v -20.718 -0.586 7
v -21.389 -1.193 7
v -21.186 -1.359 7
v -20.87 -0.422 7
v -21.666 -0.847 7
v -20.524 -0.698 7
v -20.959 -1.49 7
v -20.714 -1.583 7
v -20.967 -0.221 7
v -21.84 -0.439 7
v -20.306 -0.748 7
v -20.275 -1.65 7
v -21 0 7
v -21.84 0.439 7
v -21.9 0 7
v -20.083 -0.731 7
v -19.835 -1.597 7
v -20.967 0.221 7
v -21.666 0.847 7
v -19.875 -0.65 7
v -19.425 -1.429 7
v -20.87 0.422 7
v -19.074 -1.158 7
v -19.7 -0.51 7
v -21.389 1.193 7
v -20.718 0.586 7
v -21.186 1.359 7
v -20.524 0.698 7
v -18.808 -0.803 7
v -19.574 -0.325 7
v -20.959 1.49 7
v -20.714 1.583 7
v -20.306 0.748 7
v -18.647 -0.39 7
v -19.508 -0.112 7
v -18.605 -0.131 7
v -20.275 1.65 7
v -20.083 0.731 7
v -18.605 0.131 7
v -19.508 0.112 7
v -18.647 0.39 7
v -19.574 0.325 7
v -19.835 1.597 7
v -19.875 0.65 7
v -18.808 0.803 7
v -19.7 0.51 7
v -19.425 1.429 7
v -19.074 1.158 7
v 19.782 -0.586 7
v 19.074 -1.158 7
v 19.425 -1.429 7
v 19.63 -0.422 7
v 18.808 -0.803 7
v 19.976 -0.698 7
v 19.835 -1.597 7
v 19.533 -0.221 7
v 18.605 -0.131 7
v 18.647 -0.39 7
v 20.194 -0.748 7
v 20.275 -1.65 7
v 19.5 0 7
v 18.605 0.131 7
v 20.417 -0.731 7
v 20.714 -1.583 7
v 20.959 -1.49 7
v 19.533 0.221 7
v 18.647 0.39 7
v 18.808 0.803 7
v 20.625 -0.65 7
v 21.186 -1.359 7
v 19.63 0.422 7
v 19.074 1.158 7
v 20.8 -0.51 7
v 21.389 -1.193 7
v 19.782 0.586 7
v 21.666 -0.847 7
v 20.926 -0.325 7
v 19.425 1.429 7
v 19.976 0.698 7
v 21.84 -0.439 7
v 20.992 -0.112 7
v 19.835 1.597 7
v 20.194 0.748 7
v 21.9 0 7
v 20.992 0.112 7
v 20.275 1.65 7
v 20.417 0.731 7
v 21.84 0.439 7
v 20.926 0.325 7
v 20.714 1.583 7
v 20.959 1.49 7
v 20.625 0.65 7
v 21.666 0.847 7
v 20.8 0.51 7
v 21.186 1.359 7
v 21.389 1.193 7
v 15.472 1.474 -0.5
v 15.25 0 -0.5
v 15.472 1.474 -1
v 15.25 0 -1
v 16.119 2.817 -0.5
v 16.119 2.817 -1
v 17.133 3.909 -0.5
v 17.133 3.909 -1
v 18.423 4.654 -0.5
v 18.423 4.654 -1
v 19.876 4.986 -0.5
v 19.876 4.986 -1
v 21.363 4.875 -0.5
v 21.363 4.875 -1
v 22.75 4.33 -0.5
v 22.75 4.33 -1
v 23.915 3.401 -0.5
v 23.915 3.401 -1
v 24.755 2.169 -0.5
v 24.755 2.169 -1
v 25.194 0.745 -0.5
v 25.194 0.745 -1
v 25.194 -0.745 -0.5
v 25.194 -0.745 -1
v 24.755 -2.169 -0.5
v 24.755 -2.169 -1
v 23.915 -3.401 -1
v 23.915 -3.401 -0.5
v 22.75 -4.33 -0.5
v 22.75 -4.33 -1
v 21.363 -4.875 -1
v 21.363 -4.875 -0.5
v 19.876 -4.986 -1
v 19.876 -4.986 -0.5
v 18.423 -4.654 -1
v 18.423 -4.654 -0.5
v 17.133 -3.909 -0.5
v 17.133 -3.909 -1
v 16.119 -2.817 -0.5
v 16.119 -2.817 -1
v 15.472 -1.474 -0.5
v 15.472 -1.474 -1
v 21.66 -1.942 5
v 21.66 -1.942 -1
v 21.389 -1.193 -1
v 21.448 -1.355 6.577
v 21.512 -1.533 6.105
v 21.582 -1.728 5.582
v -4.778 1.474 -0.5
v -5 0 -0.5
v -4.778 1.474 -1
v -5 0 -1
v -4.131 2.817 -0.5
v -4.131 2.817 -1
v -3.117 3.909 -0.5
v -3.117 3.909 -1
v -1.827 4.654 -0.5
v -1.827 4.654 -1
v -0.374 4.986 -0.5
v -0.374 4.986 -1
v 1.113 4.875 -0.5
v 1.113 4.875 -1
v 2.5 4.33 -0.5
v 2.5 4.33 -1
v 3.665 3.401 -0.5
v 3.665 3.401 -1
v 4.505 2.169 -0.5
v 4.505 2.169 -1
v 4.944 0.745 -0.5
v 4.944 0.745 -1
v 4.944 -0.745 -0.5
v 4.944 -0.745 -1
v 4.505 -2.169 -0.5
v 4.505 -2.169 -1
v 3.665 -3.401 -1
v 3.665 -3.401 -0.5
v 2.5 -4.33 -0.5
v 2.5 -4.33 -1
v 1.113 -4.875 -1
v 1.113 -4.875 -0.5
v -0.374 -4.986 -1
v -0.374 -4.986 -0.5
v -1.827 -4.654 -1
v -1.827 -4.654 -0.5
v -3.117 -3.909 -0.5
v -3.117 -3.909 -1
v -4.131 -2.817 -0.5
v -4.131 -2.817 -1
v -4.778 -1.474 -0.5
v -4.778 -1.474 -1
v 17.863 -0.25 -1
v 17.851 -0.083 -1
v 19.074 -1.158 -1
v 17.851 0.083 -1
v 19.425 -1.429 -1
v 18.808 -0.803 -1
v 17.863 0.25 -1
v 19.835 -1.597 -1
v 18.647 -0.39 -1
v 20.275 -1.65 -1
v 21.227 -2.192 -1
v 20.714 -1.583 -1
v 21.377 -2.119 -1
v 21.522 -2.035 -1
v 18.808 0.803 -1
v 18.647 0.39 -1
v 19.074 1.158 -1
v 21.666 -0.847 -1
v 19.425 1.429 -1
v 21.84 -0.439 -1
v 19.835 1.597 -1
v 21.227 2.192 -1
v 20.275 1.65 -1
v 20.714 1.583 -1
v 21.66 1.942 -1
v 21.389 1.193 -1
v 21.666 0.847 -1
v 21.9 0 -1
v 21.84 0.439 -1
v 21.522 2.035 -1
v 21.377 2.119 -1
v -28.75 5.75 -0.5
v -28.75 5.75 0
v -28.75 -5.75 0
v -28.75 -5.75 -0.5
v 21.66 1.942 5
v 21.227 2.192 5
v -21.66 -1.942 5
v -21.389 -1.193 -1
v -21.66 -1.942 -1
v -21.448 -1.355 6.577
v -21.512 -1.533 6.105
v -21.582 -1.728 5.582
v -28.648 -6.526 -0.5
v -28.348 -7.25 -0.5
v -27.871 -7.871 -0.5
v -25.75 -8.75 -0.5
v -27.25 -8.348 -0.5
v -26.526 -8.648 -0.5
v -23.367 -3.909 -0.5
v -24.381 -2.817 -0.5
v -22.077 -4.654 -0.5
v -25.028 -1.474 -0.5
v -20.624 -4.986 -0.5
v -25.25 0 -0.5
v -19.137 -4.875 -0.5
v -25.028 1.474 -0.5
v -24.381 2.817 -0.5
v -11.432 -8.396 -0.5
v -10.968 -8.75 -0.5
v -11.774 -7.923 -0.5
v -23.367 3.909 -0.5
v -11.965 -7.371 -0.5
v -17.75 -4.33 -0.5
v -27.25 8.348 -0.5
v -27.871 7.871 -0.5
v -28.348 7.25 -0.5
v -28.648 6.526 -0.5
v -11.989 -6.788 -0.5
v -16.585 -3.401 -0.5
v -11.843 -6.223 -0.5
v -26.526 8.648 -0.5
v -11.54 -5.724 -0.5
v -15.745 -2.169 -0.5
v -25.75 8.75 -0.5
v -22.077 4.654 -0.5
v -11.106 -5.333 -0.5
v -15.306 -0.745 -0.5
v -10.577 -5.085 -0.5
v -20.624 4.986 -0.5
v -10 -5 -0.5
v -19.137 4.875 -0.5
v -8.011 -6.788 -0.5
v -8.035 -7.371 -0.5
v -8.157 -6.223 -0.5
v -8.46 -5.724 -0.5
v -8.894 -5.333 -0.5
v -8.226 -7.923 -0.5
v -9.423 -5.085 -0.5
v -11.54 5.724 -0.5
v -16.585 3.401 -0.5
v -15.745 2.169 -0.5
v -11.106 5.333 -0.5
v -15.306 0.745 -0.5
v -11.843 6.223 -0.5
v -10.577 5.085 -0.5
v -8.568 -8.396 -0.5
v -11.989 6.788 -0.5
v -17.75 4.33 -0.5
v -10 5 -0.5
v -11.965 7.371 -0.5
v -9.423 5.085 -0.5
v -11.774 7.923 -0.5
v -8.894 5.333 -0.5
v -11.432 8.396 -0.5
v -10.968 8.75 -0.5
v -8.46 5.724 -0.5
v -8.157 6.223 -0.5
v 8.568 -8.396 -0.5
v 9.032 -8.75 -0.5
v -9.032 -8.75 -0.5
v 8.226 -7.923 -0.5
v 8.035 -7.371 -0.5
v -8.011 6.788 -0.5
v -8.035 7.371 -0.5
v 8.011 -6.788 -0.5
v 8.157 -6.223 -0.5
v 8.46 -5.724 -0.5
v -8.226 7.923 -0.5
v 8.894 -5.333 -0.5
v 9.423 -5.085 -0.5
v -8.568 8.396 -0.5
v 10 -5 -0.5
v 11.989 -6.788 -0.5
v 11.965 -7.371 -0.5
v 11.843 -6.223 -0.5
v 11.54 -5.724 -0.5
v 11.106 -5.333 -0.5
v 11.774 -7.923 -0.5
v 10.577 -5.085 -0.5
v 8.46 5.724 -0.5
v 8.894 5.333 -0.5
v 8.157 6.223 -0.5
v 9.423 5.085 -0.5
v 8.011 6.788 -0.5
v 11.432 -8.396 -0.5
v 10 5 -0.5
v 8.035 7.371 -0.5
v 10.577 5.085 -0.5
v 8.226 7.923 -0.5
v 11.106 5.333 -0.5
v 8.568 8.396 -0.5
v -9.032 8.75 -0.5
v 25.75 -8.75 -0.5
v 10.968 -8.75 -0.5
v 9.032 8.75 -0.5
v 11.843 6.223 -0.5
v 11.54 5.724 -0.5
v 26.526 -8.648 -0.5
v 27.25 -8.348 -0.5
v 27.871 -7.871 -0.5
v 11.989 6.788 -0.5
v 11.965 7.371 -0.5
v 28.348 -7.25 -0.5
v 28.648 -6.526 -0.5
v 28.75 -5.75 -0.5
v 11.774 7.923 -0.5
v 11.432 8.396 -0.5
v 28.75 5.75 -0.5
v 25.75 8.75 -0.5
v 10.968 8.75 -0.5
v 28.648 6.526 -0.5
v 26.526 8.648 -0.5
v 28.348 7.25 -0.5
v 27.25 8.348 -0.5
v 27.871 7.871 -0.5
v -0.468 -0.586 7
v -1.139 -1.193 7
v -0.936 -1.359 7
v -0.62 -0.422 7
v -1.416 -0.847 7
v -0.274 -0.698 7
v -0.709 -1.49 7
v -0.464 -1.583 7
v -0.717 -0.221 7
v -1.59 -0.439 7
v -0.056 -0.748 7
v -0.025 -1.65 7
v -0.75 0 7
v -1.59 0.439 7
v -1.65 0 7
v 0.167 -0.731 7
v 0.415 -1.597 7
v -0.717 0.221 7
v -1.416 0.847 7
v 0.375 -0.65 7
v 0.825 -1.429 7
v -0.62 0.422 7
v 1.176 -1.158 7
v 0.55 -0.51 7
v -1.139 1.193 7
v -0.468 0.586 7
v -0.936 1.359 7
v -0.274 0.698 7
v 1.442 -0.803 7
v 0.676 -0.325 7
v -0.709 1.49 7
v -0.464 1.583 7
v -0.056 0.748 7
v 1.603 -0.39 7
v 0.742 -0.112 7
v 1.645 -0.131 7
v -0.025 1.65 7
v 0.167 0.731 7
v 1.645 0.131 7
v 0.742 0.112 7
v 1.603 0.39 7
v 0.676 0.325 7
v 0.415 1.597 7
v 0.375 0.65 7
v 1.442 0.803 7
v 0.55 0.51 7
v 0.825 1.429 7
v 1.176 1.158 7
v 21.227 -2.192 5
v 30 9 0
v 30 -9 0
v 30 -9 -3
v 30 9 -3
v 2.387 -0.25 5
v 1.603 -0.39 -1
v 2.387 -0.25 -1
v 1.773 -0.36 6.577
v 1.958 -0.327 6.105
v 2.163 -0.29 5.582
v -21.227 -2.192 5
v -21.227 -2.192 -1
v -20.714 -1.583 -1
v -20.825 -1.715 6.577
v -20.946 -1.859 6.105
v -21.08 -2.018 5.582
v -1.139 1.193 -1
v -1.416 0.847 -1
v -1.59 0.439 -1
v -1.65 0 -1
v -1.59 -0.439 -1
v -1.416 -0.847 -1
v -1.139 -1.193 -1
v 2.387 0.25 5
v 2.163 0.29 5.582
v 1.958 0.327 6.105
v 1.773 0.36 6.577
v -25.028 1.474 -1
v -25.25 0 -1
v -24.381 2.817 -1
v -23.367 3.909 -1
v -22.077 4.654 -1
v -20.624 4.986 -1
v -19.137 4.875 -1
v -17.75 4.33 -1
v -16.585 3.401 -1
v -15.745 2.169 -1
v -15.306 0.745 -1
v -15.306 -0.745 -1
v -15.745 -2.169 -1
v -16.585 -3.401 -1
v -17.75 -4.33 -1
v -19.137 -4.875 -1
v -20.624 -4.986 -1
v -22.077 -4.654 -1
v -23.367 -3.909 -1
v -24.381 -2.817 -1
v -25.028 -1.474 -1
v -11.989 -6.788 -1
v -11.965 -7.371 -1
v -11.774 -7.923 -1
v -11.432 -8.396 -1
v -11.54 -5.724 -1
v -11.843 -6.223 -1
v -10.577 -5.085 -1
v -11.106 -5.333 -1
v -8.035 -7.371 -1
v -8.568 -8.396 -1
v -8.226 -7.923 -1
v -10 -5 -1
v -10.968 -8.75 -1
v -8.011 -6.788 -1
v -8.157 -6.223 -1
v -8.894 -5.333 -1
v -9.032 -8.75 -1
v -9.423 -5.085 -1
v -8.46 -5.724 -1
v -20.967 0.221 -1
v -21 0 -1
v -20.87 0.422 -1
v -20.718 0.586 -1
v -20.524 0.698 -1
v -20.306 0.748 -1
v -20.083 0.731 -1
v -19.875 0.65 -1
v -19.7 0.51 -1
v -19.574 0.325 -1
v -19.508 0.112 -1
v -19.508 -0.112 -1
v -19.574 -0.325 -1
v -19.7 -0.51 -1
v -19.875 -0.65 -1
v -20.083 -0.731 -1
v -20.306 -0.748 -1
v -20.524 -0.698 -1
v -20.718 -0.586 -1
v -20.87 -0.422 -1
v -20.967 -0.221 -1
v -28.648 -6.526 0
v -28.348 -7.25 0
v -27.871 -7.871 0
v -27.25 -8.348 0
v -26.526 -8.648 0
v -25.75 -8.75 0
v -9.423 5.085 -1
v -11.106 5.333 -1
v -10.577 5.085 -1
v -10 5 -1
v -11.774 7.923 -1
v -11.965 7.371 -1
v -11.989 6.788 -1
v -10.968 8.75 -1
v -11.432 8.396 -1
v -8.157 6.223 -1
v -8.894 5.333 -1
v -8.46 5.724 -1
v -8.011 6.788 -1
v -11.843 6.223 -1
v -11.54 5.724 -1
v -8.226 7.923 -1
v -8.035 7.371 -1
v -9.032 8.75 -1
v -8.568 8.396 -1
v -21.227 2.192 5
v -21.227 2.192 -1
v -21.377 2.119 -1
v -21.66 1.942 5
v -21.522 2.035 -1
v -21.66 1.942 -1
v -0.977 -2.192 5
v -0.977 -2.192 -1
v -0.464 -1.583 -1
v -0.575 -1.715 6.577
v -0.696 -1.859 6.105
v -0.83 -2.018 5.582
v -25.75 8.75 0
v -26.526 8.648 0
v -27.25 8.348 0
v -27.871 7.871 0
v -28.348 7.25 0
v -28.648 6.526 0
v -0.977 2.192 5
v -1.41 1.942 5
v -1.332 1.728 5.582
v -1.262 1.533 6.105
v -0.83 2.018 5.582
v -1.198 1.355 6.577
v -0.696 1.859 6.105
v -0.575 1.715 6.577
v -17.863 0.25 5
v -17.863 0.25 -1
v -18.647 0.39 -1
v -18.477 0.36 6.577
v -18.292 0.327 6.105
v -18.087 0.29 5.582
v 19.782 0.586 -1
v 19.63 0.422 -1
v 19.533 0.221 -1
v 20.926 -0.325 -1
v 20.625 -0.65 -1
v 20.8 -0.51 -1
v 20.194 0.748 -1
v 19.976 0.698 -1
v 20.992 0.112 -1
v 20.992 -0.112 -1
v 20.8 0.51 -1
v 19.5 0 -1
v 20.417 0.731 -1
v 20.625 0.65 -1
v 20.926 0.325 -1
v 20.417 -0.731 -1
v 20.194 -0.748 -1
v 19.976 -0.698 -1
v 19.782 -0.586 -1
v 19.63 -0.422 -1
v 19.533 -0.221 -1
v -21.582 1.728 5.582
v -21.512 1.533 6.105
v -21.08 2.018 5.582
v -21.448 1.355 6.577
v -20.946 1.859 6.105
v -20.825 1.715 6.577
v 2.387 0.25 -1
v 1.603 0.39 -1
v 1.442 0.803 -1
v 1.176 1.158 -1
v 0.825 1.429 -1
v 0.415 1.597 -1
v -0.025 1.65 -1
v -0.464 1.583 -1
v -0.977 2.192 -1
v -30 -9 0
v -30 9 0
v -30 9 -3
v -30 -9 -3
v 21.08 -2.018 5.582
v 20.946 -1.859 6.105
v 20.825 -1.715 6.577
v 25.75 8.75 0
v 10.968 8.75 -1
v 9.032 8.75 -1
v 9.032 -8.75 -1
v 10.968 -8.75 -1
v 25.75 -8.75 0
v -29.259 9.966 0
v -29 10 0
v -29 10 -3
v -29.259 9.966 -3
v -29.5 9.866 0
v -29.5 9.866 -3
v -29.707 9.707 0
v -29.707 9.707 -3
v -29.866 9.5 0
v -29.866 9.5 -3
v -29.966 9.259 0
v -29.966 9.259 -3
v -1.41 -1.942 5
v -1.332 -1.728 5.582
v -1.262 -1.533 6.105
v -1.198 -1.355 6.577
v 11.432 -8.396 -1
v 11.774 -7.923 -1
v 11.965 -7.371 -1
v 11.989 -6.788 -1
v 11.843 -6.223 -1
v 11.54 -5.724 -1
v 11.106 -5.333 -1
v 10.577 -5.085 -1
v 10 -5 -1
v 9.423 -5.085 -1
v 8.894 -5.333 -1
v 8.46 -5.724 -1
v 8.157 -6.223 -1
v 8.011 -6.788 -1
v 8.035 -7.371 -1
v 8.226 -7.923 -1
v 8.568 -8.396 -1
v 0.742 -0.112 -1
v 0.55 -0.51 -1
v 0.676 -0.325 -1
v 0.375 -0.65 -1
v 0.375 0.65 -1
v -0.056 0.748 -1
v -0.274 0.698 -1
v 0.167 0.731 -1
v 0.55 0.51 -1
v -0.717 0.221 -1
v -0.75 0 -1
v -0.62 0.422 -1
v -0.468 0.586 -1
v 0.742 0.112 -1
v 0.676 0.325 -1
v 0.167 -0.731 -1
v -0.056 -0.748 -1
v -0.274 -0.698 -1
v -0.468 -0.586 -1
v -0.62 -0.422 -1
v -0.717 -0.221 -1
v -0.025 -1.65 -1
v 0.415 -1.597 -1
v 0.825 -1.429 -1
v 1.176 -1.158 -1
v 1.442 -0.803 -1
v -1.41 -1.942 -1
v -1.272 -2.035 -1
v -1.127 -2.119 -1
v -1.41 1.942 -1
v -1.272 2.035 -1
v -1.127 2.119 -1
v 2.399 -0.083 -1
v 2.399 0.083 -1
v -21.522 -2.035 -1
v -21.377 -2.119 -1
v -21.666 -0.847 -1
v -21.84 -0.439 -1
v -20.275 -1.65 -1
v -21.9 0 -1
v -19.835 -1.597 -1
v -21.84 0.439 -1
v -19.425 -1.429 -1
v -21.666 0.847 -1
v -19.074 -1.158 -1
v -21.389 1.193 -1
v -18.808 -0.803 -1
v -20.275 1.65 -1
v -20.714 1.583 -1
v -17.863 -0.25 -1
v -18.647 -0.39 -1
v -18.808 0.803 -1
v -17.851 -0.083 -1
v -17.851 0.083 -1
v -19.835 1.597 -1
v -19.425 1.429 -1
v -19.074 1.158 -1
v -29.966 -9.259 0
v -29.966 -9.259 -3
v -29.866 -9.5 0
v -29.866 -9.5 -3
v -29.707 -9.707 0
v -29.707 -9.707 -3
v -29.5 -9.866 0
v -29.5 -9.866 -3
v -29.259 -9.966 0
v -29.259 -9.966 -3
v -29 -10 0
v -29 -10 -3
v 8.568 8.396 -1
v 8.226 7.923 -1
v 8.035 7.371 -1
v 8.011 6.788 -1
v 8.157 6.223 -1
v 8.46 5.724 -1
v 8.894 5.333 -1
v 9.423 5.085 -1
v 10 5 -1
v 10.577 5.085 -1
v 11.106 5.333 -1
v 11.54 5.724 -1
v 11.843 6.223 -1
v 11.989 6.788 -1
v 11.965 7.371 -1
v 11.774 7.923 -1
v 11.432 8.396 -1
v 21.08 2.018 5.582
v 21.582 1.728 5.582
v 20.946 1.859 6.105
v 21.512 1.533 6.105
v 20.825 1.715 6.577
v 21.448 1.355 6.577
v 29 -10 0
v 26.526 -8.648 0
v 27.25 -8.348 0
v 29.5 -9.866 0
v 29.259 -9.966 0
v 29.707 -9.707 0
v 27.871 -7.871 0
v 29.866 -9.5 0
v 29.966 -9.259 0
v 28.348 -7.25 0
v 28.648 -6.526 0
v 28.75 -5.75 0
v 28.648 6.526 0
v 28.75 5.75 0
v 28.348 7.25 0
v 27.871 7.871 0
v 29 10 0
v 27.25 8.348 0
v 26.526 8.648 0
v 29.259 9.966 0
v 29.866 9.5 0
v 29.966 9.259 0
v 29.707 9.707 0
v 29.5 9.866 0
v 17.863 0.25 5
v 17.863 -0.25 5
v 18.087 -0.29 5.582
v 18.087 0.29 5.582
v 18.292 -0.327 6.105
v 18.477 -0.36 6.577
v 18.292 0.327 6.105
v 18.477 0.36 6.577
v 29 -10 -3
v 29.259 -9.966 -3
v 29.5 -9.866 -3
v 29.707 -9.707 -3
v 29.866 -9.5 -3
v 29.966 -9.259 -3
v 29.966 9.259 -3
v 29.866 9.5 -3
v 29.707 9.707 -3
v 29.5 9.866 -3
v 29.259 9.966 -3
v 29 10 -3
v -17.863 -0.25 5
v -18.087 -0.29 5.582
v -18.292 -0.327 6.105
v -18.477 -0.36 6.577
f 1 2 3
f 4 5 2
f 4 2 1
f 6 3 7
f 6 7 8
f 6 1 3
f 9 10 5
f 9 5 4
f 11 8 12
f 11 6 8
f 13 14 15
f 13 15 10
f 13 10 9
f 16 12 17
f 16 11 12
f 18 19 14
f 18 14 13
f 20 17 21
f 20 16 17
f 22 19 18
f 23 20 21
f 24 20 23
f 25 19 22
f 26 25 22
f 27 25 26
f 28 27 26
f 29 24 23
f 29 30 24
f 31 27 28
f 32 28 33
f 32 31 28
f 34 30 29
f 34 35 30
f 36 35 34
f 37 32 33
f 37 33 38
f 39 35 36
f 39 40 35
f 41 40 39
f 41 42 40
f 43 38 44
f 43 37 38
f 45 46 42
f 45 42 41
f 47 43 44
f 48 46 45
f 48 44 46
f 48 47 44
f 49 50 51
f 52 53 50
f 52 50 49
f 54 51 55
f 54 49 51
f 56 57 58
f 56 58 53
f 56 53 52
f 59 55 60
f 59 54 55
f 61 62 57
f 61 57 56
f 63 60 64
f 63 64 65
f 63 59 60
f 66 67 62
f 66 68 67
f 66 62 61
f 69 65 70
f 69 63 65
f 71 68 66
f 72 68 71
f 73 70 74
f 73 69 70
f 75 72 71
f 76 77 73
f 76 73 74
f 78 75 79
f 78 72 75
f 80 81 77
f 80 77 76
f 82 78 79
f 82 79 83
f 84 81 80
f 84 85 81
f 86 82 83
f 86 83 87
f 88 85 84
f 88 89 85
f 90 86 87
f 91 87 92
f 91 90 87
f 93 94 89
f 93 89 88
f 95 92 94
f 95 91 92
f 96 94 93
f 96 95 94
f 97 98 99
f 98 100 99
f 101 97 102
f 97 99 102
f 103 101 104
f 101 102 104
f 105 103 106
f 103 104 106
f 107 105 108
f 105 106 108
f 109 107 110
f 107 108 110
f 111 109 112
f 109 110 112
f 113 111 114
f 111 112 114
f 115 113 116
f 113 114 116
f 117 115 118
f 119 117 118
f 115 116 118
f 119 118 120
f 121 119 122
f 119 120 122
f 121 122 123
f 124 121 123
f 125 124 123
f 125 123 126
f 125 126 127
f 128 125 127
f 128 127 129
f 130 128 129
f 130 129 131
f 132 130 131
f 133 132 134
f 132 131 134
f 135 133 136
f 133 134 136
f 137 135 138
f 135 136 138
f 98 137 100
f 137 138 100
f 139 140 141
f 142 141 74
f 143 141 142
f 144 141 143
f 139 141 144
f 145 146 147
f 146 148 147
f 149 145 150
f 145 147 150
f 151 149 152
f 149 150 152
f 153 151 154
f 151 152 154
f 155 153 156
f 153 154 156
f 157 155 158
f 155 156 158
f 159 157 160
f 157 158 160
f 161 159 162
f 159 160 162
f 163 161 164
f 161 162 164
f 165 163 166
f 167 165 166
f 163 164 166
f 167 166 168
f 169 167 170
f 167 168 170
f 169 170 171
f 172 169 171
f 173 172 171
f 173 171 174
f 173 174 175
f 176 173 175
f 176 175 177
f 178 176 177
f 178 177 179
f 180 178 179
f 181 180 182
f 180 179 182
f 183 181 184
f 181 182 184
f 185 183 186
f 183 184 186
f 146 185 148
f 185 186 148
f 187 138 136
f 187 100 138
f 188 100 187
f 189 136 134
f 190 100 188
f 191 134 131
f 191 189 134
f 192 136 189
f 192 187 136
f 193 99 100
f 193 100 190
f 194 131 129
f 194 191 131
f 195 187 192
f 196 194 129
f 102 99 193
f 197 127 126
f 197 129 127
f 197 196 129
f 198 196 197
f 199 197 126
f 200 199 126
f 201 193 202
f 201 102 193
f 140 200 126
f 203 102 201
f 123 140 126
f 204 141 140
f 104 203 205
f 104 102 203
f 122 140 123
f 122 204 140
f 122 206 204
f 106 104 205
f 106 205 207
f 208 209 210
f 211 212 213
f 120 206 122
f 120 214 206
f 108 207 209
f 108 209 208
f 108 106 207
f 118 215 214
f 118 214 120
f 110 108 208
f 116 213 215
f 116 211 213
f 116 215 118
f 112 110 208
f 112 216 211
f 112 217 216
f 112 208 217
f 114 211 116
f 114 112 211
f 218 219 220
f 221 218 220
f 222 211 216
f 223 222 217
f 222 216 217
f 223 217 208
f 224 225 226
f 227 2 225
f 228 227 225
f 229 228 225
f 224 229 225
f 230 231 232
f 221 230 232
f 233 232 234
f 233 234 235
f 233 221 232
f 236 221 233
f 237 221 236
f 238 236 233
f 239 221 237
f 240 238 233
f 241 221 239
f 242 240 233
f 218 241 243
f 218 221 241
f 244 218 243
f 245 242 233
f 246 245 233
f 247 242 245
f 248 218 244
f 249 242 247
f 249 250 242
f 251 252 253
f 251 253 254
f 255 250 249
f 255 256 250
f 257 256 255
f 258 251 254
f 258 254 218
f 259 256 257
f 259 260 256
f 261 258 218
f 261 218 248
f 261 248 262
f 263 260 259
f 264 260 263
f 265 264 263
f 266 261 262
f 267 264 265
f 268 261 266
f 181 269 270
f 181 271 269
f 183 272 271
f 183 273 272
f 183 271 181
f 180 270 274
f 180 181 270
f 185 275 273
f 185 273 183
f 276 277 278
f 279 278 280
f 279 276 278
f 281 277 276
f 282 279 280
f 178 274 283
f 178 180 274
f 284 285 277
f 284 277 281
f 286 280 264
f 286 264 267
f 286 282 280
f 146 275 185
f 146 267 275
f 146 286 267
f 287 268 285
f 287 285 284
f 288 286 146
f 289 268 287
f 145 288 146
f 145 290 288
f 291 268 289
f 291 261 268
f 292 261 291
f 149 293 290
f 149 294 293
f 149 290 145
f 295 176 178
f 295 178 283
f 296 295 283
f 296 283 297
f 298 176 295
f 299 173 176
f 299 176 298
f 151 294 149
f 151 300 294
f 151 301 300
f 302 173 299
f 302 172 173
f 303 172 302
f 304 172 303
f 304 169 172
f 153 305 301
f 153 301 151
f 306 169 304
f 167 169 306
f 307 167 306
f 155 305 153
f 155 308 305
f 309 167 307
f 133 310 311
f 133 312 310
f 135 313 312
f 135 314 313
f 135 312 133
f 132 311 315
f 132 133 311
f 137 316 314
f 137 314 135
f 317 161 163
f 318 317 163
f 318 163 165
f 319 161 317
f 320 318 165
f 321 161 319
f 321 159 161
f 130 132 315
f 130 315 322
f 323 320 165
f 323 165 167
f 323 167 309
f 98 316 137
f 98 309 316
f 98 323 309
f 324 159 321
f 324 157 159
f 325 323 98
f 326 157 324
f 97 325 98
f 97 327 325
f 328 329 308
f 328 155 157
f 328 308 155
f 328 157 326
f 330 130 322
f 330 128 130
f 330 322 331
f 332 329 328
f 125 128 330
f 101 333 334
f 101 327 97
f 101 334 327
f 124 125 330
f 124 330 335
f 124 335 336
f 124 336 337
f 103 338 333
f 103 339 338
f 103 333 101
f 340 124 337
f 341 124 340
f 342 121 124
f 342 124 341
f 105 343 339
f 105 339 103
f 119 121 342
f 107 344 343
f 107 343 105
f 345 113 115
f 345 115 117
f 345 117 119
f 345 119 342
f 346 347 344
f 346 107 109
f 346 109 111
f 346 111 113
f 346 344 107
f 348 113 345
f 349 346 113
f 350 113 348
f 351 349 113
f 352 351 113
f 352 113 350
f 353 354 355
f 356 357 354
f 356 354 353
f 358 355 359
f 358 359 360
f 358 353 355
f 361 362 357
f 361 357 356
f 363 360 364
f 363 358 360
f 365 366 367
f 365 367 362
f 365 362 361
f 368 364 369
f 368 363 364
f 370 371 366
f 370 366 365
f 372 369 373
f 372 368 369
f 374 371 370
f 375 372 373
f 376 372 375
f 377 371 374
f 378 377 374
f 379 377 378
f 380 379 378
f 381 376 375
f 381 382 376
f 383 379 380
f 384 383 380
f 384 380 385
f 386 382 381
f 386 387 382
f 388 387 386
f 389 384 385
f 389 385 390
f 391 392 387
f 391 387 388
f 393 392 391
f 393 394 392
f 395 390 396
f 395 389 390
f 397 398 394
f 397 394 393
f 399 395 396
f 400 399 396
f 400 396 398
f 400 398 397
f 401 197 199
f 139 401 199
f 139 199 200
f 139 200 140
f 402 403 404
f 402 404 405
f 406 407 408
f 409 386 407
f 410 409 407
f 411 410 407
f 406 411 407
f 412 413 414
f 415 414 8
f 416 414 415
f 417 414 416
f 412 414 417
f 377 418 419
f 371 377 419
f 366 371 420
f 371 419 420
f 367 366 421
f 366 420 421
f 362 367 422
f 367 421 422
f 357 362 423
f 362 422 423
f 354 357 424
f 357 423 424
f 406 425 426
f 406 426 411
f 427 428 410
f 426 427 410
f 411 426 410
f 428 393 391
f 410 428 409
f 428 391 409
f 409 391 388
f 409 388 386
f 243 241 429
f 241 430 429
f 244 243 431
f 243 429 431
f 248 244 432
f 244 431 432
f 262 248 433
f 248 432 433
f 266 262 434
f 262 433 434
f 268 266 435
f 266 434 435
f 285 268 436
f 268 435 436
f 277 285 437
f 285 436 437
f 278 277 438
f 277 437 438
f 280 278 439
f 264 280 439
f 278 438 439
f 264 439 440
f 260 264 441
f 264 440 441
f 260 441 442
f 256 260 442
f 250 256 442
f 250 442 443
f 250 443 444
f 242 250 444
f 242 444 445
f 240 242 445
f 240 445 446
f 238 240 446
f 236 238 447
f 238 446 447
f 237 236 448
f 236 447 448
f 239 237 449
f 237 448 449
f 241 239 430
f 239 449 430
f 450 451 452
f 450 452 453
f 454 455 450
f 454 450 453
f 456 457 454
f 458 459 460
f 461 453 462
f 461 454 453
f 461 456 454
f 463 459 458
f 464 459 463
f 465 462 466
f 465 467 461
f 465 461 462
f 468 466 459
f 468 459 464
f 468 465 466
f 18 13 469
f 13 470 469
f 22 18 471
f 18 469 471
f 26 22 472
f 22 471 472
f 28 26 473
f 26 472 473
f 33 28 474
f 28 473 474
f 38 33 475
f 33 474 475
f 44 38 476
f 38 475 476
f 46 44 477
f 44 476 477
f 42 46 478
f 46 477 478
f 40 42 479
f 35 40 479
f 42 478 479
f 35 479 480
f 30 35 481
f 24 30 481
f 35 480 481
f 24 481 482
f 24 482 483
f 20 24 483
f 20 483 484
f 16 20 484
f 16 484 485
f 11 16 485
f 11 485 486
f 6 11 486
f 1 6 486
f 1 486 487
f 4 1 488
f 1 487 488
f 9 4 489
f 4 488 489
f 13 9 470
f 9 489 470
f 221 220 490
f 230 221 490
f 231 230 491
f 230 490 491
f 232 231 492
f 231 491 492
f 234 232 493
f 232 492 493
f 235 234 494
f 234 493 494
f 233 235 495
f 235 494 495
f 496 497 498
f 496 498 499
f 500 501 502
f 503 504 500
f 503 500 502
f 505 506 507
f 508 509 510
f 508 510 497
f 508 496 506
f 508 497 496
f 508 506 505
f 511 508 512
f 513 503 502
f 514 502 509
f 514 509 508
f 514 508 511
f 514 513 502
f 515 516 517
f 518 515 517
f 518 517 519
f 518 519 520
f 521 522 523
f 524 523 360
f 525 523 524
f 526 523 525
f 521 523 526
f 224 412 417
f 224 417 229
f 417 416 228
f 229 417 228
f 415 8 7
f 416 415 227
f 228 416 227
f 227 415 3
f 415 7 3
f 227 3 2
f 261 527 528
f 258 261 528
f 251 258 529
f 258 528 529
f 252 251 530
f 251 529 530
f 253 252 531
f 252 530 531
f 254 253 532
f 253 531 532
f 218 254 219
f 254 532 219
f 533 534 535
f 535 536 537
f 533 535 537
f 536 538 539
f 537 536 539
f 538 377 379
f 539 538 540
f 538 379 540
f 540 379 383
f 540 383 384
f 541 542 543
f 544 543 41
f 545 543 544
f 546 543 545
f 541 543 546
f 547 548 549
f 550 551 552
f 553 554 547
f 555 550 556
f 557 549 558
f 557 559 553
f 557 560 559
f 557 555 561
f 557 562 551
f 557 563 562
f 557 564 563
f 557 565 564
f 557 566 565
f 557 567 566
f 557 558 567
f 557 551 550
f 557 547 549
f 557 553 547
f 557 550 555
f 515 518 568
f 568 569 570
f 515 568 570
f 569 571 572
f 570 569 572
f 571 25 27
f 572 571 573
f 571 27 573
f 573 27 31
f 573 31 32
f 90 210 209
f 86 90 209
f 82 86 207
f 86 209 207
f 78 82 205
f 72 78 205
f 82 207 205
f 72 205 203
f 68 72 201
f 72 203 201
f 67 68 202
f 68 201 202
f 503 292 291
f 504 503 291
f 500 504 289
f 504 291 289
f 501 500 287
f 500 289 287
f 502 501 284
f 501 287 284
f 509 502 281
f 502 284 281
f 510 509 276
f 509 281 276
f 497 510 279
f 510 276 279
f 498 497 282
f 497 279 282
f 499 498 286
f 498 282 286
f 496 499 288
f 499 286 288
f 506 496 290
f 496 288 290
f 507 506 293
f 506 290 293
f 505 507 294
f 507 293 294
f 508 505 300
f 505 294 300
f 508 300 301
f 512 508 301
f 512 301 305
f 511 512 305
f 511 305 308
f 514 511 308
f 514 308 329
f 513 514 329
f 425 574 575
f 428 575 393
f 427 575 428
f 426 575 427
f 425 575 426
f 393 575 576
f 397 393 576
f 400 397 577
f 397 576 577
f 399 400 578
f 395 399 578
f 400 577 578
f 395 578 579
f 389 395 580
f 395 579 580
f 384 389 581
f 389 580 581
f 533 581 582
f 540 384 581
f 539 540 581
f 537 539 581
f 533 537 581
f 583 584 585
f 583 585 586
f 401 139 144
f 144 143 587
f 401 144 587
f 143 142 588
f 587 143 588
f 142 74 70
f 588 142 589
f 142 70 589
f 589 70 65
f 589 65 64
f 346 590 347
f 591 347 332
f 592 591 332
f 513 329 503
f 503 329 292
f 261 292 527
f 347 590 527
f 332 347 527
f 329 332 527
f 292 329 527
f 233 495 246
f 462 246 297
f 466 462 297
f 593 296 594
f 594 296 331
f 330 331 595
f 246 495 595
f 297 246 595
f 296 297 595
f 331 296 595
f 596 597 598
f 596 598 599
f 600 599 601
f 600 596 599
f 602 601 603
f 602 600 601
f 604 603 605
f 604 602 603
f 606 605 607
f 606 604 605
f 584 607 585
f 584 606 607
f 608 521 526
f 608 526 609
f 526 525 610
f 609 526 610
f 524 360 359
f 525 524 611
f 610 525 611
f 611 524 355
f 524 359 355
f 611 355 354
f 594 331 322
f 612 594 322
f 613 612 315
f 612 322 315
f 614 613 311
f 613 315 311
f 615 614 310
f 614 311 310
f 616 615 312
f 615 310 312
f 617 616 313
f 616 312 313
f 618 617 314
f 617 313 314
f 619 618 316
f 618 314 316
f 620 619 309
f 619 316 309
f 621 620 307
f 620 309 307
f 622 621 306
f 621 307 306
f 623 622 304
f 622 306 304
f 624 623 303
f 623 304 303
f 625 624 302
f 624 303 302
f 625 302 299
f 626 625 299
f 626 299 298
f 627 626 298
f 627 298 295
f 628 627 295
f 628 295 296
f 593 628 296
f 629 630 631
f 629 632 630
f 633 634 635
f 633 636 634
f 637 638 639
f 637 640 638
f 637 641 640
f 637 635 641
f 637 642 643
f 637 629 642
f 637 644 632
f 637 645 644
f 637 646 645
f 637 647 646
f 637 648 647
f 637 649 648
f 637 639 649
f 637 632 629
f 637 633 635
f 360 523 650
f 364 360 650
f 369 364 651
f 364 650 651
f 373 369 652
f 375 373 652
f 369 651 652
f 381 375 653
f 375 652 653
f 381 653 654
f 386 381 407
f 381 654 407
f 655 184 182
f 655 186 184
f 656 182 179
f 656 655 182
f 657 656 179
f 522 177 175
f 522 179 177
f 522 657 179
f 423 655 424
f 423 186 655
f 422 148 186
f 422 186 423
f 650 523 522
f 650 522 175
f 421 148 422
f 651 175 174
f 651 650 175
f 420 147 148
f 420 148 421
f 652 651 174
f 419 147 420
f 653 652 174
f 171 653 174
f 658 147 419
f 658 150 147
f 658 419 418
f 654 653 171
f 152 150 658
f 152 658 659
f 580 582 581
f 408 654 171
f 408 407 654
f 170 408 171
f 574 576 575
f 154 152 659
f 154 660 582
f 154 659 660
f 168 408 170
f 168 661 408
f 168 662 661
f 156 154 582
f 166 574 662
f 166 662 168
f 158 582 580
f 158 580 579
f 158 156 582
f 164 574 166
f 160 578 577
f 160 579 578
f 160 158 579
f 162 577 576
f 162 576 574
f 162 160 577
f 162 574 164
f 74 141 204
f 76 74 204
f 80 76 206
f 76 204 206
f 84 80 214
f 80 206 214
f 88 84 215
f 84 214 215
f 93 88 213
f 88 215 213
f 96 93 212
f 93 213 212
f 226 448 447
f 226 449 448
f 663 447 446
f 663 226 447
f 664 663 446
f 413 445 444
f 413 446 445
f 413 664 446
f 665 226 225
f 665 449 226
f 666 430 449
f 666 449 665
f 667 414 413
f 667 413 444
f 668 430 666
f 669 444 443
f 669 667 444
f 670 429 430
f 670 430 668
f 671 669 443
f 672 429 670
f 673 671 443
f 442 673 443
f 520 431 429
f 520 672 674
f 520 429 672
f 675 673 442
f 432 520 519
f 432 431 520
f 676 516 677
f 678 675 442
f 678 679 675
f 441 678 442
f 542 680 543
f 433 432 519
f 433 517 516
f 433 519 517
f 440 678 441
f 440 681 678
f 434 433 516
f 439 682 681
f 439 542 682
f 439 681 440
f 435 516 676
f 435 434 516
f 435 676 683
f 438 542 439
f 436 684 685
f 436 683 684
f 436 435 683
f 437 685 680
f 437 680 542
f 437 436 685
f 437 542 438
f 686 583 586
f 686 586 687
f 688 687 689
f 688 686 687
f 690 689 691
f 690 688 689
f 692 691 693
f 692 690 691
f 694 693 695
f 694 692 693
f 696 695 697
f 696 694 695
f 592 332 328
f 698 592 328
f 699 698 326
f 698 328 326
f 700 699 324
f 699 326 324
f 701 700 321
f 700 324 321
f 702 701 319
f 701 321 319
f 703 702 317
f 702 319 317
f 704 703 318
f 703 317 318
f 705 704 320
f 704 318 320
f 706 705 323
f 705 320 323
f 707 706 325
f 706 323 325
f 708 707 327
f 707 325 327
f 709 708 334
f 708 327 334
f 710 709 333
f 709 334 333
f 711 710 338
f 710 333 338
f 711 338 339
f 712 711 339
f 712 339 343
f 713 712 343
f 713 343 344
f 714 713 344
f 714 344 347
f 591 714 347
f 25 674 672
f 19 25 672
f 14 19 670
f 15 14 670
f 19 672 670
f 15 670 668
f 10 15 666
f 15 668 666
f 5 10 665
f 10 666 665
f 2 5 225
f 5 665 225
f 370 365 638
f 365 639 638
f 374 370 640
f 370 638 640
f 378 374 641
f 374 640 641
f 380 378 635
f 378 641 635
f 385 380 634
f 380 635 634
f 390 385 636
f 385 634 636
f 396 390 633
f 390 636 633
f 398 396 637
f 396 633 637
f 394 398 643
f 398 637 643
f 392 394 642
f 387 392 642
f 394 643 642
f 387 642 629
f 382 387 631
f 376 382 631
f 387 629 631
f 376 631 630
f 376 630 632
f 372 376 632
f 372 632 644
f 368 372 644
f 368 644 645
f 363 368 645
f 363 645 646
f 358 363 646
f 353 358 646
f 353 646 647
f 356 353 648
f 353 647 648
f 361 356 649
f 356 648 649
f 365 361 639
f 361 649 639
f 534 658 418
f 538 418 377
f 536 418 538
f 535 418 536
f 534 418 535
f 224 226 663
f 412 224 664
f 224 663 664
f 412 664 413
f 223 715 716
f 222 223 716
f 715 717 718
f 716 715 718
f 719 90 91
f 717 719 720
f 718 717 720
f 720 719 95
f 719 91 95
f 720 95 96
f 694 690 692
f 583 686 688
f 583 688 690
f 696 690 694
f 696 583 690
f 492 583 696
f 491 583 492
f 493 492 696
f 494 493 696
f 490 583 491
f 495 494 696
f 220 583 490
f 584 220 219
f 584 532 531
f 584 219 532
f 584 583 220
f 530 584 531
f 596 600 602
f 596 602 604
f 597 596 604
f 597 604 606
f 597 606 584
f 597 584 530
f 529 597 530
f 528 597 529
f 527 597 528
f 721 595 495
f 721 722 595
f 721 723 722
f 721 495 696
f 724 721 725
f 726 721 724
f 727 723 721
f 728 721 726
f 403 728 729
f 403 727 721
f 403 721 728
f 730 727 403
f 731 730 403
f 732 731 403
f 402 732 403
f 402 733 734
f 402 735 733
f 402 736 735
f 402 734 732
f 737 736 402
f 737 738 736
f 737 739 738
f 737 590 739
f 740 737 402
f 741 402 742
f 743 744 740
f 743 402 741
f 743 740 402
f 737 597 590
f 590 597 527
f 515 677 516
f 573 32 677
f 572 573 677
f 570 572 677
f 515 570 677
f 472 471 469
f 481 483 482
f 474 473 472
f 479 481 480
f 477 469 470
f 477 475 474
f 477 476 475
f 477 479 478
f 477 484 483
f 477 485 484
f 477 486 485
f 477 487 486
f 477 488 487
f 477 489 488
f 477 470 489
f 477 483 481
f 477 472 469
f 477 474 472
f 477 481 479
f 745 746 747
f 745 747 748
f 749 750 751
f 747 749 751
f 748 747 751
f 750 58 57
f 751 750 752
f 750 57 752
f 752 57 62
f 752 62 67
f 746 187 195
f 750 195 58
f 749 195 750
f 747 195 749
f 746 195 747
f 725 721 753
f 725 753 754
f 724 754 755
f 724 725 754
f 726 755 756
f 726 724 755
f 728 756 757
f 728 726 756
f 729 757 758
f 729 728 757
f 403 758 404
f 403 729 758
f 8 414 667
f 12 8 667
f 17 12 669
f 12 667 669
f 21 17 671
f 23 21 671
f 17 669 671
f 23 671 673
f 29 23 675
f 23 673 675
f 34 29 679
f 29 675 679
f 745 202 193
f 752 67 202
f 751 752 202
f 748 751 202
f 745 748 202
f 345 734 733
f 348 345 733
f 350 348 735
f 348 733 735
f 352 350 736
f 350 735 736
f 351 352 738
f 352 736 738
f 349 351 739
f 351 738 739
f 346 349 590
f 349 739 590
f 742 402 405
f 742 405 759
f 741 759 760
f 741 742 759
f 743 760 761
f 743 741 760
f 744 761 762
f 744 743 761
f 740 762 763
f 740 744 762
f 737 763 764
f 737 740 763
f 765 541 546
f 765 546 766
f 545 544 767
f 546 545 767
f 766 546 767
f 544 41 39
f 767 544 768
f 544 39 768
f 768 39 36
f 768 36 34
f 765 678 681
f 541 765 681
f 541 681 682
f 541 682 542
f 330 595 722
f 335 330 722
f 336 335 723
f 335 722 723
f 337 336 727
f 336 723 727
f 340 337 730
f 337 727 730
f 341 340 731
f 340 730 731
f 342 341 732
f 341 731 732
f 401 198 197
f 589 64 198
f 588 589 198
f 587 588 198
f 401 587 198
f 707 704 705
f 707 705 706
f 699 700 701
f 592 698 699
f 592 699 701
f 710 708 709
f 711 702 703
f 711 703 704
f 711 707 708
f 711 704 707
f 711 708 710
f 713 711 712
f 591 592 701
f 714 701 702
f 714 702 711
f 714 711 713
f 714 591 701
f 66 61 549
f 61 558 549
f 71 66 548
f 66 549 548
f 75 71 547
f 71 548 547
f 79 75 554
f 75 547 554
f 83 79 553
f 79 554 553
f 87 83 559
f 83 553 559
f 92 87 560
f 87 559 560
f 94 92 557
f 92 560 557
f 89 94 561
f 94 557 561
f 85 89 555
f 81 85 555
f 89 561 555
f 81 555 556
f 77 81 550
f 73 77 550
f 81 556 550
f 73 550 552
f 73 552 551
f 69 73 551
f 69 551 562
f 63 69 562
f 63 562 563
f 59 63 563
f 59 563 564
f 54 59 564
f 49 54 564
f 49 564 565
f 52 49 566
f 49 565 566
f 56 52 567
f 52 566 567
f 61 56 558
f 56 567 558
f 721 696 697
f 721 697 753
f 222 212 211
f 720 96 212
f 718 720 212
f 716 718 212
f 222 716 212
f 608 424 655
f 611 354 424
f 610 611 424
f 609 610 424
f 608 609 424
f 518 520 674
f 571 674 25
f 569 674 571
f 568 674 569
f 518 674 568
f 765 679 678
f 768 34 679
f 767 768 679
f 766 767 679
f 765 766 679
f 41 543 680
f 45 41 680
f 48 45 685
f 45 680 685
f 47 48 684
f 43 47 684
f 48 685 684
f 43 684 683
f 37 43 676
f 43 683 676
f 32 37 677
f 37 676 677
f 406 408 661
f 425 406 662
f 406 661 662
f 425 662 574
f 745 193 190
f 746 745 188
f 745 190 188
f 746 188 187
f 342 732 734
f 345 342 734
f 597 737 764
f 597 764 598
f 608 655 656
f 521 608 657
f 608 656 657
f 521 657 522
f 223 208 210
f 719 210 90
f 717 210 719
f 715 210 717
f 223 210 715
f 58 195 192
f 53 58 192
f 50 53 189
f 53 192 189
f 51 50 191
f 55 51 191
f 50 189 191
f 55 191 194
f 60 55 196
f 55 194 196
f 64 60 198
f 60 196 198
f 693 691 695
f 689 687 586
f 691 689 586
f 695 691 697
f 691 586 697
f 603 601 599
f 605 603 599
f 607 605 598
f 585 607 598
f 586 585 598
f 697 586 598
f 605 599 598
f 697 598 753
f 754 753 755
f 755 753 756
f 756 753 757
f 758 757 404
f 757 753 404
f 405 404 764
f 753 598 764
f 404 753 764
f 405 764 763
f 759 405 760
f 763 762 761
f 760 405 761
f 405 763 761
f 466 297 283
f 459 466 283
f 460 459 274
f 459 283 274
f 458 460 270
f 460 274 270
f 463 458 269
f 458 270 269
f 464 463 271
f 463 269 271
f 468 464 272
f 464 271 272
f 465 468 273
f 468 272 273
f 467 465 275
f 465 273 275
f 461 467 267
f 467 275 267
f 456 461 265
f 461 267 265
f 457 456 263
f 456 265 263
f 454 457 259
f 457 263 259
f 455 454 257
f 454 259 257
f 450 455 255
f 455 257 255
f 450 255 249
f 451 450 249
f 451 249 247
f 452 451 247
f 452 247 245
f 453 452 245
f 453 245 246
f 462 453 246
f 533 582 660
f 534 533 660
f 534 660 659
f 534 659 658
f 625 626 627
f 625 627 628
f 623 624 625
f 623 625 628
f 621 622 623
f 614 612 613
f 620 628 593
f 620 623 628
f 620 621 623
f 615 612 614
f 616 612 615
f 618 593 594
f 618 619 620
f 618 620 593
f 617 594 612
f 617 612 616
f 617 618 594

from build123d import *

# Parameters (mm, degrees)
BOSS_EXTRUDE1_DEPTH = 3
CUT_EXTRUDE1_DEPTH  = 0.5
SKETCH3_W           = 5
SKETCH3_H           = 0.5
SKETCH4_W           = 5
SKETCH4_H           = 0.5
SKETCH5_W           = 5
SKETCH5_H           = 0.5
CUT_EXTRUDE2_DEPTH  = 0.5
CUT_EXTRUDE3_DEPTH  = 0.5
CUT_EXTRUDE4_DEPTH  = 0.5
CUT_EXTRUDE5_DEPTH  = 0.5
BOSS_EXTRUDE2_DEPTH = 8
BOSS_EXTRUDE3_DEPTH = 8
BOSS_EXTRUDE4_DEPTH = 8
SKETCH16_W          = 0.75
SKETCH16_H          = 8
SKETCH17_W          = 0.75
SKETCH17_H          = 8
SKETCH18_W          = 0.75
SKETCH18_H          = 8


with BuildPart() as part:
    # Sketch1 → Boss-Extrude1 (new body)
    with BuildSketch(Plane.XY):
        with BuildLine():
            Line((-29, -10), (29, -10))
            ThreePointArc((29, -10), (29.707106781, -9.707106781), (30, -9))
            Line((30, -9), (30, 9))
            ThreePointArc((30, 9), (29.707106781, 9.707106781), (29, 10))
            Line((29, 10), (-29, 10))
            ThreePointArc((-29, 10), (-29.707106781, 9.707106781), (-30, 9))
            Line((-30, 9), (-30, -9))
            ThreePointArc((-30, -9), (-29.707106781, -9.707106781), (-29, -10))
        make_face()
    extrude(amount=-BOSS_EXTRUDE1_DEPTH)

    # Sketch2 → Cut-Extrude1 (cut)
    with BuildSketch(Plane.XY):
        with BuildLine():
            Line((-25.75, -8.75), (25.75, -8.75))
            ThreePointArc((25.75, -8.75), (27.871320344, -7.871320344), (28.75, -5.75))
            Line((28.75, -5.75), (28.75, 5.75))
            ThreePointArc((28.75, 5.75), (27.871320344, 7.871320344), (25.75, 8.75))
            Line((25.75, 8.75), (-25.75, 8.75))
            ThreePointArc((-25.75, 8.75), (-27.871320344, 7.871320344), (-28.75, 5.75))
            Line((-28.75, 5.75), (-28.75, -5.75))
            ThreePointArc((-28.75, -5.75), (-27.871320344, -7.871320344), (-25.75, -8.75))
        make_face()
    extrude(amount=-CUT_EXTRUDE1_DEPTH, mode=Mode.SUBTRACT)

    # Sketch3 → Cut-Revolve1 (revolve, cut)
    with BuildSketch(Plane(origin=(0, 0, 0), x_dir=(1, 0, 0), z_dir=(0, 1, 0)), mode=Mode.PRIVATE) as cut_revolve1_sk:
        with Locations((-17.75, 0.75)):
            Rectangle(SKETCH3_W, SKETCH3_H)
    revolve(cut_revolve1_sk.sketch.rotate(Axis((-20.25, 0, -0.5), (0, 0, -1)), 180), axis=Axis((-20.25, 0, -0.5), (0, 0, -1)), mode=Mode.SUBTRACT)

    # Sketch4 → Cut-Revolve2 (revolve, cut)
    with BuildSketch(Plane(origin=(0, 0, 0), x_dir=(1, 0, 0), z_dir=(0, 1, 0)), mode=Mode.PRIVATE) as cut_revolve2_sk:
        with Locations((2.5, 0.75)):
            Rectangle(SKETCH4_W, SKETCH4_H)
    revolve(cut_revolve2_sk.sketch.rotate(Axis((0, 0, -0.5), (0, 0, -1)), 180), axis=Axis((0, 0, -0.5), (0, 0, -1)), mode=Mode.SUBTRACT)

    # Sketch5 → Cut-Revolve3 (revolve, cut)
    with BuildSketch(Plane(origin=(0, 0, 0), x_dir=(1, 0, 0), z_dir=(0, 1, 0)), mode=Mode.PRIVATE) as cut_revolve3_sk:
        with Locations((22.75, 0.75)):
            Rectangle(SKETCH5_W, SKETCH5_H)
    revolve(cut_revolve3_sk.sketch.rotate(Axis((20.25, 0, -0.5), (0, 0, -1)), 180), axis=Axis((20.25, 0, -0.5), (0, 0, -1)), mode=Mode.SUBTRACT)

    # Sketch6 → Cut-Extrude2 (cut)
    with BuildSketch(Plane.XY.offset(-0.5)):
        with BuildLine():
            Line((-9.031754163, 8.75), (-10.968245837, 8.75))
            ThreePointArc((-10.968245837, 8.75), (-10, 5), (-9.031754163, 8.75))
        make_face()
    extrude(amount=-CUT_EXTRUDE2_DEPTH, mode=Mode.SUBTRACT)

    # Sketch7 → Cut-Extrude3 (cut)
    with BuildSketch(Plane.XY.offset(-0.5)):
        with BuildLine():
            Line((10.968245837, 8.75), (9.031754163, 8.75))
            ThreePointArc((9.031754163, 8.75), (10, 5), (10.968245837, 8.75))
        make_face()
    extrude(amount=-CUT_EXTRUDE3_DEPTH, mode=Mode.SUBTRACT)

    # Sketch8 → Cut-Extrude4 (cut)
    with BuildSketch(Plane.XY.offset(-0.5)):
        with BuildLine():
            Line((-10.968245837, -8.75), (-9.031754163, -8.75))
            ThreePointArc((-9.031754163, -8.75), (-10, -5), (-10.968245837, -8.75))
        make_face()
    extrude(amount=-CUT_EXTRUDE4_DEPTH, mode=Mode.SUBTRACT)

    # Sketch9 → Cut-Extrude5 (cut)
    with BuildSketch(Plane.XY.offset(-0.5)):
        with BuildLine():
            Line((9.031754163, -8.75), (10.968245837, -8.75))
            ThreePointArc((10.968245837, -8.75), (10, -5), (9.031754163, -8.75))
        make_face()
    extrude(amount=-CUT_EXTRUDE5_DEPTH, mode=Mode.SUBTRACT)

    # Sketch10 → Boss-Extrude2 (add)
    with BuildSketch(Plane.XY.offset(-1)):
        with BuildLine():
            Line((-1.13937326, -1.193452376), (-1.409978177, -1.94215384))
            ThreePointArc((-1.409978177, -1.94215384), (-1.2, -2.078460969), (-0.976965475, -2.19215384))
            Line((-0.976965475, -2.19215384), (-0.463873445, -1.583452376))
            ThreePointArc((-0.463873445, -1.583452376), (0.825, -1.428941916), (1.603246706, -0.39))
            Line((1.603246706, -0.39), (2.386943652, -0.25))
            ThreePointArc((2.386943652, -0.25), (2.4, 0), (2.386943652, 0.25))
            Line((2.386943652, 0.25), (1.603246706, 0.39))
            ThreePointArc((1.603246706, 0.39), (0.825, 1.428941916), (-0.463873445, 1.583452376))
            Line((-0.463873445, 1.583452376), (-0.976965475, 2.19215384))
            ThreePointArc((-0.976965475, 2.19215384), (-1.2, 2.078460969), (-1.409978177, 1.94215384))
            Line((-1.409978177, 1.94215384), (-1.13937326, 1.193452376))
            ThreePointArc((-1.13937326, 1.193452376), (-1.65, 0), (-1.13937326, -1.193452376))
        make_face()
    extrude(amount=BOSS_EXTRUDE2_DEPTH)

    # Sketch11 → Boss-Extrude3 (add)
    with BuildSketch(Plane.XY.offset(-1)):
        with BuildLine():
            Line((-21.38937326, -1.193452376), (-21.659978177, -1.94215384))
            ThreePointArc((-21.659978177, -1.94215384), (-21.45, -2.078460969), (-21.226965475, -2.19215384))
            Line((-21.226965475, -2.19215384), (-20.713873445, -1.583452376))
            ThreePointArc((-20.713873445, -1.583452376), (-19.425, -1.428941916), (-18.646753294, -0.39))
            Line((-18.646753294, -0.39), (-17.863056348, -0.25))
            ThreePointArc((-17.863056348, -0.25), (-17.85, 0), (-17.863056348, 0.25))
            Line((-17.863056348, 0.25), (-18.646753294, 0.39))
            ThreePointArc((-18.646753294, 0.39), (-19.425, 1.428941916), (-20.713873445, 1.583452376))
            Line((-20.713873445, 1.583452376), (-21.226965475, 2.19215384))
            ThreePointArc((-21.226965475, 2.19215384), (-21.45, 2.078460969), (-21.659978177, 1.94215384))
            Line((-21.659978177, 1.94215384), (-21.38937326, 1.193452376))
            ThreePointArc((-21.38937326, 1.193452376), (-21.9, 0), (-21.38937326, -1.193452376))
        make_face()
    extrude(amount=BOSS_EXTRUDE3_DEPTH)

    # Sketch12 → Boss-Extrude4 (add)
    with BuildSketch(Plane.XY.offset(-1)):
        with BuildLine():
            Line((17.863056348, -0.25), (18.646753294, -0.39))
            ThreePointArc((18.646753294, -0.39), (19.425, -1.428941916), (20.713873445, -1.583452376))
            Line((20.713873445, -1.583452376), (21.226965475, -2.19215384))
            ThreePointArc((21.226965475, -2.19215384), (21.45, -2.078460969), (21.659978177, -1.94215384))
            Line((21.659978177, -1.94215384), (21.38937326, -1.193452376))
            ThreePointArc((21.38937326, -1.193452376), (21.9, 0), (21.38937326, 1.193452376))
            Line((21.38937326, 1.193452376), (21.659978177, 1.94215384))
            ThreePointArc((21.659978177, 1.94215384), (21.45, 2.078460969), (21.226965475, 2.19215384))
            Line((21.226965475, 2.19215384), (20.713873445, 1.583452376))
            ThreePointArc((20.713873445, 1.583452376), (19.425, 1.428941916), (18.646753294, 0.39))
            Line((18.646753294, 0.39), (17.863056348, 0.25))
            ThreePointArc((17.863056348, 0.25), (17.85, 0), (17.863056348, -0.25))
        make_face()
    extrude(amount=BOSS_EXTRUDE4_DEPTH)

    # Sketch13 → Cut-Revolve4 (revolve, cut)
    with BuildSketch(Plane(origin=(0, 0, 0), x_dir=(1, 0, 0), z_dir=(0, 1, 0))):
        Polygon((-18.7125, -7.3), (-17.55, -7.3), (-17.55, -4.2), align=None)
    revolve(axis=Axis((-20.25, 0, 50), (0, 0, -1)), mode=Mode.SUBTRACT)

    # Sketch14 → Cut-Revolve5 (revolve, cut)
    with BuildSketch(Plane(origin=(0, 0, 0), x_dir=(1, 0, 0), z_dir=(0, 1, 0))):
        Polygon((1.5375, -7.3), (2.7, -7.3), (2.7, -4.2), align=None)
    revolve(axis=Axis((0, 0, 50), (0, 0, -1)), mode=Mode.SUBTRACT)

    # Sketch15 → Cut-Revolve6 (revolve, cut)
    with BuildSketch(Plane(origin=(0, 0, 0), x_dir=(1, 0, 0), z_dir=(0, 1, 0))):
        Polygon((21.7875, -7.3), (22.95, -7.3), (22.95, -4.2), align=None)
    revolve(axis=Axis((20.25, 0, 50), (0, 0, -1)), mode=Mode.SUBTRACT)

    # Sketch16 → Cut-Revolve7 (revolve, cut)
    with BuildSketch(Plane(origin=(0, 0, 0), x_dir=(1, 0, 0), z_dir=(0, 1, 0)), mode=Mode.PRIVATE) as cut_revolve7_sk:
        with Locations((-19.875, -3)):
            Rectangle(SKETCH16_W, SKETCH16_H)
    revolve(cut_revolve7_sk.sketch.rotate(Axis((-20.25, 0, 7), (0, 0, -1)), 180), axis=Axis((-20.25, 0, 7), (0, 0, -1)), mode=Mode.SUBTRACT)

    # Sketch17 → Cut-Revolve8 (revolve, cut)
    with BuildSketch(Plane(origin=(0, 0, 0), x_dir=(1, 0, 0), z_dir=(0, 1, 0)), mode=Mode.PRIVATE) as cut_revolve8_sk:
        with Locations((0.375, -3)):
            Rectangle(SKETCH17_W, SKETCH17_H)
    revolve(cut_revolve8_sk.sketch.rotate(Axis((0, 0, 7), (0, 0, -1)), 180), axis=Axis((0, 0, 7), (0, 0, -1)), mode=Mode.SUBTRACT)

    # Sketch18 → Cut-Revolve9 (revolve, cut)
    with BuildSketch(Plane(origin=(0, 0, 0), x_dir=(1, 0, 0), z_dir=(0, 1, 0)), mode=Mode.PRIVATE) as cut_revolve9_sk:
        with Locations((20.625, -3)):
            Rectangle(SKETCH18_W, SKETCH18_H)
    revolve(cut_revolve9_sk.sketch.rotate(Axis((20.25, 0, 7), (0, 0, -1)), 180), axis=Axis((20.25, 0, 7), (0, 0, -1)), mode=Mode.SUBTRACT)


solid = part.part
